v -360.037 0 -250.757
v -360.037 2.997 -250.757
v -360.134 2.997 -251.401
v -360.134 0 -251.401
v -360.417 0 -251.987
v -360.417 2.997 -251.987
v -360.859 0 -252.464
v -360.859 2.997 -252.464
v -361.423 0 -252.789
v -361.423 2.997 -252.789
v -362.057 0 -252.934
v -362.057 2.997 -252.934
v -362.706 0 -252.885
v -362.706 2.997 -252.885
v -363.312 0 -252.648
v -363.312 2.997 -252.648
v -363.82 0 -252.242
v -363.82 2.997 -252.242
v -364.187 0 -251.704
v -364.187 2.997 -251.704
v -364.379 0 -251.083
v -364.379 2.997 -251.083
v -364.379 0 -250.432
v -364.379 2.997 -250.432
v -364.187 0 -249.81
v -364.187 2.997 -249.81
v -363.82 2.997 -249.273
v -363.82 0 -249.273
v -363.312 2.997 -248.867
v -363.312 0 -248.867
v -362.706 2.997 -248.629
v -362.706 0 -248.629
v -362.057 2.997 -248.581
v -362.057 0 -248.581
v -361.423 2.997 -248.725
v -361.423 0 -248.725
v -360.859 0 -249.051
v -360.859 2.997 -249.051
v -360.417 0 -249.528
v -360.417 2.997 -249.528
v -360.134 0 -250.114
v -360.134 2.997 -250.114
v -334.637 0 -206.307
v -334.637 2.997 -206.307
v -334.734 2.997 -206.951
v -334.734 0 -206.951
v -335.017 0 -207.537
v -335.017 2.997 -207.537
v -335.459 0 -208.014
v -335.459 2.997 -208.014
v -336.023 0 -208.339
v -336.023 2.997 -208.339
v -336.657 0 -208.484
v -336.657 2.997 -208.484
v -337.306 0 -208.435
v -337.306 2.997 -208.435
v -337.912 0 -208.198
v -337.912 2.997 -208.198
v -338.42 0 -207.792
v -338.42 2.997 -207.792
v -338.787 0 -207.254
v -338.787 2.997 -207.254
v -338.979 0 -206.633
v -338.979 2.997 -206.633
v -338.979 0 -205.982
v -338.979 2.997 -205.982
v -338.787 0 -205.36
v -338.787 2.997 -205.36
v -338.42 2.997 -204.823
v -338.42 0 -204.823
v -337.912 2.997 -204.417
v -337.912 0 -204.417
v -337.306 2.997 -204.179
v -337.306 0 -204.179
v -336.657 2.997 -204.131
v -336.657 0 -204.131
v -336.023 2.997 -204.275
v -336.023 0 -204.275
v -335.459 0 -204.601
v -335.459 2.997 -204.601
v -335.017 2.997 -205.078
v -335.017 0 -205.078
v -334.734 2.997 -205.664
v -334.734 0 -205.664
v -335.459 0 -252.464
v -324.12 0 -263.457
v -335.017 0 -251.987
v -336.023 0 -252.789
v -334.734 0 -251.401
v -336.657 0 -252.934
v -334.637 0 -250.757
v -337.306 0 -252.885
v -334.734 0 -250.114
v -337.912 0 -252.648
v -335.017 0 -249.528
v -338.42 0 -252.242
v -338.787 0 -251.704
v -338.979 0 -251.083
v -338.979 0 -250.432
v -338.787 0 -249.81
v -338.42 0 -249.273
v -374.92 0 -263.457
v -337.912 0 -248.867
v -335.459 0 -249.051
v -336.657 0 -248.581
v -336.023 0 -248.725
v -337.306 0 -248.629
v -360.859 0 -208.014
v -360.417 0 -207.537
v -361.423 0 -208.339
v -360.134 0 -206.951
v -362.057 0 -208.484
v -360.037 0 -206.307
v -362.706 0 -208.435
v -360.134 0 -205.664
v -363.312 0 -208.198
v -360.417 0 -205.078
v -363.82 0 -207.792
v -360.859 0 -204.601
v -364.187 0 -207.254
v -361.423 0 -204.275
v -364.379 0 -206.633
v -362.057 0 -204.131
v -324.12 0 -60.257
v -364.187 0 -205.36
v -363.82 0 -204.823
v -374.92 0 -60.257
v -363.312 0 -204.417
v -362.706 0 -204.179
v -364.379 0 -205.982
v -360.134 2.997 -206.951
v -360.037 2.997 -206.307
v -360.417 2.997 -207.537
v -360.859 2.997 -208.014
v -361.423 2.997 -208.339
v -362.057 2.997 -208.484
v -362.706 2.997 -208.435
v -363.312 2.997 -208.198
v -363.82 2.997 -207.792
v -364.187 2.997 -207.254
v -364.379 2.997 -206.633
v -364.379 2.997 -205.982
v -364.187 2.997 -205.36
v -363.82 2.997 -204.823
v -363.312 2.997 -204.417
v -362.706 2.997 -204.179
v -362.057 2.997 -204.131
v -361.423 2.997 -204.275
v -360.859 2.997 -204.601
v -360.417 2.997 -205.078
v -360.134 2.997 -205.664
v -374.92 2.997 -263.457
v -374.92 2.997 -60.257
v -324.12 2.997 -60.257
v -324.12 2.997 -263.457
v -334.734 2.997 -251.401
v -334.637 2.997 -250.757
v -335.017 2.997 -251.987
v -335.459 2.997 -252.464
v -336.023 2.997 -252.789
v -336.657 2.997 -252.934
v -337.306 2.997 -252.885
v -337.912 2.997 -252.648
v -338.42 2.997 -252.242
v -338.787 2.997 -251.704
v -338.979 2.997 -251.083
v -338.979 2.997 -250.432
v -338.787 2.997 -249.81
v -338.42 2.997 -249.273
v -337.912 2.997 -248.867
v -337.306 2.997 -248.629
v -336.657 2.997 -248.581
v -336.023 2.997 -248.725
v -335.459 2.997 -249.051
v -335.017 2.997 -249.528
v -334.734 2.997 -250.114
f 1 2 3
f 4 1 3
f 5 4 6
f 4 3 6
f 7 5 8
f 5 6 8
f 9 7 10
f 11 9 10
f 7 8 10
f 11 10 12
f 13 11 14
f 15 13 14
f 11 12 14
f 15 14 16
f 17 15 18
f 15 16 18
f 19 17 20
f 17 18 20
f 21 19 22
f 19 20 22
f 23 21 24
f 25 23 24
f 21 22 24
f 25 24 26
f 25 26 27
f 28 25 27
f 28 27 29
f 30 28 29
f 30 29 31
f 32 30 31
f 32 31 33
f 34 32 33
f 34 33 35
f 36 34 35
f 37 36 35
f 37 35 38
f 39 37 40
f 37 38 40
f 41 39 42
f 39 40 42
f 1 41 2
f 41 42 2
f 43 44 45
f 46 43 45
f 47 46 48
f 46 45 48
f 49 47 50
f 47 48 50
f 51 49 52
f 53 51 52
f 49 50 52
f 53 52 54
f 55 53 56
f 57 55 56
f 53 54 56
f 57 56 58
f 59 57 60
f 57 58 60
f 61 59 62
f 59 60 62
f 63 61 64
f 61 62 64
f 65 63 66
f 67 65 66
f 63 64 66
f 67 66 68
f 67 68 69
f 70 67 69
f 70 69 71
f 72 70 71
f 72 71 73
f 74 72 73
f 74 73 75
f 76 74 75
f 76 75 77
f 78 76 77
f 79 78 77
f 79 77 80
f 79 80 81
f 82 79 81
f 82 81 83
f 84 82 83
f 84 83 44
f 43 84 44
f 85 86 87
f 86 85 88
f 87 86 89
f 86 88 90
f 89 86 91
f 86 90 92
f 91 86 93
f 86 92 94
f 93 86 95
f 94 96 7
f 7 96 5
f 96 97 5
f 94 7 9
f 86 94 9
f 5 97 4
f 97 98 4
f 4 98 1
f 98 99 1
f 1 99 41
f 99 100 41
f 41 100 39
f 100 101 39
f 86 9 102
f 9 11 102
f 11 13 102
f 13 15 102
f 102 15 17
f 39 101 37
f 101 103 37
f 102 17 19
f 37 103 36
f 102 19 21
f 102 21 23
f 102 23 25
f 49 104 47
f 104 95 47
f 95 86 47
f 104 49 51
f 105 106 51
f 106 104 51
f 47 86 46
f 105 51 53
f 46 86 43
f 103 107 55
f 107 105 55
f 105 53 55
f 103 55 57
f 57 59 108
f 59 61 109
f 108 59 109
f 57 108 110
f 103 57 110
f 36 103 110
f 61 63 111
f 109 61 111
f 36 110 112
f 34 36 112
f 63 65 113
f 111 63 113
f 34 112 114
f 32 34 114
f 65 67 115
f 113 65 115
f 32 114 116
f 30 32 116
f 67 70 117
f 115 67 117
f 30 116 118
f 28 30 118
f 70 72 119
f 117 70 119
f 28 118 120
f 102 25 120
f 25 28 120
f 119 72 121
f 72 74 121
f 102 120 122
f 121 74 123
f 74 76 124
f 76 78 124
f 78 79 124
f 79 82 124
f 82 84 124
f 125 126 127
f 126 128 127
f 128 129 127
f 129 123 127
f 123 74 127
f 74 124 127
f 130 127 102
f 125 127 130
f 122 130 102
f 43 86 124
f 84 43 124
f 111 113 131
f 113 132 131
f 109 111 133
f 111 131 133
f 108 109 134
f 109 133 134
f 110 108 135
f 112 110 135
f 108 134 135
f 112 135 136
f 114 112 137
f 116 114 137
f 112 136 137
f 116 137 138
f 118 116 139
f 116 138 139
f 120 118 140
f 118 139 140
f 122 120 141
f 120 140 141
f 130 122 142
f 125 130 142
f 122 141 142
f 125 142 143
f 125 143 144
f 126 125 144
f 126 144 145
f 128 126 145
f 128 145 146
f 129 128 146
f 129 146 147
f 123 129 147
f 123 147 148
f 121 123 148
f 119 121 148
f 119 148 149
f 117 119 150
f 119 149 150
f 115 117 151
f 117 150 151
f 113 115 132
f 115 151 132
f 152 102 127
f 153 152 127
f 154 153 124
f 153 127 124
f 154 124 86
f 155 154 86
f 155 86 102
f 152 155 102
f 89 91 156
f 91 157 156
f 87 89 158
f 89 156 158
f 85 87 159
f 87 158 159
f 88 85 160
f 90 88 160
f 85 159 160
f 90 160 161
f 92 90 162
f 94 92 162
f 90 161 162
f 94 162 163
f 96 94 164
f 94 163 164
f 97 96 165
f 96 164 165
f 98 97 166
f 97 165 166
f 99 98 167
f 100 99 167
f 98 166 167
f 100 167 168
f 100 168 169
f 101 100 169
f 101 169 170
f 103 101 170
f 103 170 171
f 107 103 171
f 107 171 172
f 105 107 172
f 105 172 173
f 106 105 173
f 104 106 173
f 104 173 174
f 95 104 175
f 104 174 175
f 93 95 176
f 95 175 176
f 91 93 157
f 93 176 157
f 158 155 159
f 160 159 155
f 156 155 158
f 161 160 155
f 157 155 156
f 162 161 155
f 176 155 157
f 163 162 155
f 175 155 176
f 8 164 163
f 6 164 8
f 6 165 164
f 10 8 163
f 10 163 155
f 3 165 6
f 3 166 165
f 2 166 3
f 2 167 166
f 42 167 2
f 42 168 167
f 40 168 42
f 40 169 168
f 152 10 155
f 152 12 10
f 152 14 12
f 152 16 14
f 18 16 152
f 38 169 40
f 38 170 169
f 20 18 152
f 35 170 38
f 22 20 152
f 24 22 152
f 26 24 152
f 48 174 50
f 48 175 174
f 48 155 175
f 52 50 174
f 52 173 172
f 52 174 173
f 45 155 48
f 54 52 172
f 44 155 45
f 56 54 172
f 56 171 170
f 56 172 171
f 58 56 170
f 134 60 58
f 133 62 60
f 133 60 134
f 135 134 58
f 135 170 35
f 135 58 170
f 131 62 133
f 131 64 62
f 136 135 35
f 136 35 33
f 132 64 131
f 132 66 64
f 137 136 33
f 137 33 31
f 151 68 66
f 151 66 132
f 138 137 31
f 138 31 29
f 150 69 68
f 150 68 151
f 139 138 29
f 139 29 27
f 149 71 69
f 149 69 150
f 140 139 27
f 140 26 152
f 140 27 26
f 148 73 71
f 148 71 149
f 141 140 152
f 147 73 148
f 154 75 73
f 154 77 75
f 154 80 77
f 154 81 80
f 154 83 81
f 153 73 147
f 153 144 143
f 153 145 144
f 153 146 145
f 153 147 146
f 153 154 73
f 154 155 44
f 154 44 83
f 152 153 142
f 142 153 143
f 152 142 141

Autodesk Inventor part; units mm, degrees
ref_plane "YZ Plane" through (0, 0, 0) normal (1, 0, 0) x (0, 1, 0)
ref_plane "XZ Plane" through (0, 0, 0) normal (0, 1, 0) x (-1, 0, 0)
ref_plane "XY Plane" through (0, 0, 0) normal (0, 0, 1) x (1, 0, 0)
sketch "Sketch1" plane through (0, 0, 0) normal (0, 1, 0) x (-1, 0, 0)
  line L0 (374.9202, -60.2574) -> (324.1202, -60.2574)
  line L1 (324.1202, -60.2574) -> (324.1202, -263.4574)
  line L2 (324.1202, -263.4574) -> (374.9202, -263.4574)
  line L3 (374.9202, -263.4574) -> (374.9202, -60.2574)
  point P0 (0, 0)
  dimension "d0" = 203.2
  dimension "d1" = 50.8
extrude "Extrusion1" add sketch "Sketch1" along normal blind 2.9972
sketch "Sketch2" plane through (0, 2.9972, 0) normal (0, 1, 0) x (1, 0, 0)
  line L0 (-336.8202, 206.3074) -> (-362.2202, 206.3074) construction
  line L1 (-362.2202, 206.3074) -> (-362.2202, 250.7574) construction
  line L2 (-362.2202, 250.7574) -> (-336.8202, 250.7574) construction
  line L3 (-336.8202, 250.7574) -> (-336.8202, 206.3074) construction
  line L4 (-336.8202, 206.3074) -> (-362.2202, 250.7574) construction
  line L5 (-362.2202, 206.3074) -> (-336.8202, 250.7574) construction
  line L6 (-324.1202, 263.4574) -> (-374.9202, 263.4574) projected
  line L7 (-349.5202, 228.5324) -> (-349.5202, 263.4574) construction
  circle A0 centre (-362.2202, 250.7574) radius 2.1828
  circle A1 centre (-336.8202, 250.7574) radius 2.1828
  circle A2 centre (-336.8202, 206.3074) radius 2.1828
  circle A3 centre (-362.2202, 206.3074) radius 2.1828
  point P0 (0, 0)
  dimension "d4" = 25.4
  dimension "d5" = 44.45
  dimension "d6" = 12.7
  dimension "d7" = 4.3656
extrude "Extrusion2" cut sketch "Sketch2" against normal through all
properties part number "8x2 Lexan" material "Polycarbonate, Clear"
